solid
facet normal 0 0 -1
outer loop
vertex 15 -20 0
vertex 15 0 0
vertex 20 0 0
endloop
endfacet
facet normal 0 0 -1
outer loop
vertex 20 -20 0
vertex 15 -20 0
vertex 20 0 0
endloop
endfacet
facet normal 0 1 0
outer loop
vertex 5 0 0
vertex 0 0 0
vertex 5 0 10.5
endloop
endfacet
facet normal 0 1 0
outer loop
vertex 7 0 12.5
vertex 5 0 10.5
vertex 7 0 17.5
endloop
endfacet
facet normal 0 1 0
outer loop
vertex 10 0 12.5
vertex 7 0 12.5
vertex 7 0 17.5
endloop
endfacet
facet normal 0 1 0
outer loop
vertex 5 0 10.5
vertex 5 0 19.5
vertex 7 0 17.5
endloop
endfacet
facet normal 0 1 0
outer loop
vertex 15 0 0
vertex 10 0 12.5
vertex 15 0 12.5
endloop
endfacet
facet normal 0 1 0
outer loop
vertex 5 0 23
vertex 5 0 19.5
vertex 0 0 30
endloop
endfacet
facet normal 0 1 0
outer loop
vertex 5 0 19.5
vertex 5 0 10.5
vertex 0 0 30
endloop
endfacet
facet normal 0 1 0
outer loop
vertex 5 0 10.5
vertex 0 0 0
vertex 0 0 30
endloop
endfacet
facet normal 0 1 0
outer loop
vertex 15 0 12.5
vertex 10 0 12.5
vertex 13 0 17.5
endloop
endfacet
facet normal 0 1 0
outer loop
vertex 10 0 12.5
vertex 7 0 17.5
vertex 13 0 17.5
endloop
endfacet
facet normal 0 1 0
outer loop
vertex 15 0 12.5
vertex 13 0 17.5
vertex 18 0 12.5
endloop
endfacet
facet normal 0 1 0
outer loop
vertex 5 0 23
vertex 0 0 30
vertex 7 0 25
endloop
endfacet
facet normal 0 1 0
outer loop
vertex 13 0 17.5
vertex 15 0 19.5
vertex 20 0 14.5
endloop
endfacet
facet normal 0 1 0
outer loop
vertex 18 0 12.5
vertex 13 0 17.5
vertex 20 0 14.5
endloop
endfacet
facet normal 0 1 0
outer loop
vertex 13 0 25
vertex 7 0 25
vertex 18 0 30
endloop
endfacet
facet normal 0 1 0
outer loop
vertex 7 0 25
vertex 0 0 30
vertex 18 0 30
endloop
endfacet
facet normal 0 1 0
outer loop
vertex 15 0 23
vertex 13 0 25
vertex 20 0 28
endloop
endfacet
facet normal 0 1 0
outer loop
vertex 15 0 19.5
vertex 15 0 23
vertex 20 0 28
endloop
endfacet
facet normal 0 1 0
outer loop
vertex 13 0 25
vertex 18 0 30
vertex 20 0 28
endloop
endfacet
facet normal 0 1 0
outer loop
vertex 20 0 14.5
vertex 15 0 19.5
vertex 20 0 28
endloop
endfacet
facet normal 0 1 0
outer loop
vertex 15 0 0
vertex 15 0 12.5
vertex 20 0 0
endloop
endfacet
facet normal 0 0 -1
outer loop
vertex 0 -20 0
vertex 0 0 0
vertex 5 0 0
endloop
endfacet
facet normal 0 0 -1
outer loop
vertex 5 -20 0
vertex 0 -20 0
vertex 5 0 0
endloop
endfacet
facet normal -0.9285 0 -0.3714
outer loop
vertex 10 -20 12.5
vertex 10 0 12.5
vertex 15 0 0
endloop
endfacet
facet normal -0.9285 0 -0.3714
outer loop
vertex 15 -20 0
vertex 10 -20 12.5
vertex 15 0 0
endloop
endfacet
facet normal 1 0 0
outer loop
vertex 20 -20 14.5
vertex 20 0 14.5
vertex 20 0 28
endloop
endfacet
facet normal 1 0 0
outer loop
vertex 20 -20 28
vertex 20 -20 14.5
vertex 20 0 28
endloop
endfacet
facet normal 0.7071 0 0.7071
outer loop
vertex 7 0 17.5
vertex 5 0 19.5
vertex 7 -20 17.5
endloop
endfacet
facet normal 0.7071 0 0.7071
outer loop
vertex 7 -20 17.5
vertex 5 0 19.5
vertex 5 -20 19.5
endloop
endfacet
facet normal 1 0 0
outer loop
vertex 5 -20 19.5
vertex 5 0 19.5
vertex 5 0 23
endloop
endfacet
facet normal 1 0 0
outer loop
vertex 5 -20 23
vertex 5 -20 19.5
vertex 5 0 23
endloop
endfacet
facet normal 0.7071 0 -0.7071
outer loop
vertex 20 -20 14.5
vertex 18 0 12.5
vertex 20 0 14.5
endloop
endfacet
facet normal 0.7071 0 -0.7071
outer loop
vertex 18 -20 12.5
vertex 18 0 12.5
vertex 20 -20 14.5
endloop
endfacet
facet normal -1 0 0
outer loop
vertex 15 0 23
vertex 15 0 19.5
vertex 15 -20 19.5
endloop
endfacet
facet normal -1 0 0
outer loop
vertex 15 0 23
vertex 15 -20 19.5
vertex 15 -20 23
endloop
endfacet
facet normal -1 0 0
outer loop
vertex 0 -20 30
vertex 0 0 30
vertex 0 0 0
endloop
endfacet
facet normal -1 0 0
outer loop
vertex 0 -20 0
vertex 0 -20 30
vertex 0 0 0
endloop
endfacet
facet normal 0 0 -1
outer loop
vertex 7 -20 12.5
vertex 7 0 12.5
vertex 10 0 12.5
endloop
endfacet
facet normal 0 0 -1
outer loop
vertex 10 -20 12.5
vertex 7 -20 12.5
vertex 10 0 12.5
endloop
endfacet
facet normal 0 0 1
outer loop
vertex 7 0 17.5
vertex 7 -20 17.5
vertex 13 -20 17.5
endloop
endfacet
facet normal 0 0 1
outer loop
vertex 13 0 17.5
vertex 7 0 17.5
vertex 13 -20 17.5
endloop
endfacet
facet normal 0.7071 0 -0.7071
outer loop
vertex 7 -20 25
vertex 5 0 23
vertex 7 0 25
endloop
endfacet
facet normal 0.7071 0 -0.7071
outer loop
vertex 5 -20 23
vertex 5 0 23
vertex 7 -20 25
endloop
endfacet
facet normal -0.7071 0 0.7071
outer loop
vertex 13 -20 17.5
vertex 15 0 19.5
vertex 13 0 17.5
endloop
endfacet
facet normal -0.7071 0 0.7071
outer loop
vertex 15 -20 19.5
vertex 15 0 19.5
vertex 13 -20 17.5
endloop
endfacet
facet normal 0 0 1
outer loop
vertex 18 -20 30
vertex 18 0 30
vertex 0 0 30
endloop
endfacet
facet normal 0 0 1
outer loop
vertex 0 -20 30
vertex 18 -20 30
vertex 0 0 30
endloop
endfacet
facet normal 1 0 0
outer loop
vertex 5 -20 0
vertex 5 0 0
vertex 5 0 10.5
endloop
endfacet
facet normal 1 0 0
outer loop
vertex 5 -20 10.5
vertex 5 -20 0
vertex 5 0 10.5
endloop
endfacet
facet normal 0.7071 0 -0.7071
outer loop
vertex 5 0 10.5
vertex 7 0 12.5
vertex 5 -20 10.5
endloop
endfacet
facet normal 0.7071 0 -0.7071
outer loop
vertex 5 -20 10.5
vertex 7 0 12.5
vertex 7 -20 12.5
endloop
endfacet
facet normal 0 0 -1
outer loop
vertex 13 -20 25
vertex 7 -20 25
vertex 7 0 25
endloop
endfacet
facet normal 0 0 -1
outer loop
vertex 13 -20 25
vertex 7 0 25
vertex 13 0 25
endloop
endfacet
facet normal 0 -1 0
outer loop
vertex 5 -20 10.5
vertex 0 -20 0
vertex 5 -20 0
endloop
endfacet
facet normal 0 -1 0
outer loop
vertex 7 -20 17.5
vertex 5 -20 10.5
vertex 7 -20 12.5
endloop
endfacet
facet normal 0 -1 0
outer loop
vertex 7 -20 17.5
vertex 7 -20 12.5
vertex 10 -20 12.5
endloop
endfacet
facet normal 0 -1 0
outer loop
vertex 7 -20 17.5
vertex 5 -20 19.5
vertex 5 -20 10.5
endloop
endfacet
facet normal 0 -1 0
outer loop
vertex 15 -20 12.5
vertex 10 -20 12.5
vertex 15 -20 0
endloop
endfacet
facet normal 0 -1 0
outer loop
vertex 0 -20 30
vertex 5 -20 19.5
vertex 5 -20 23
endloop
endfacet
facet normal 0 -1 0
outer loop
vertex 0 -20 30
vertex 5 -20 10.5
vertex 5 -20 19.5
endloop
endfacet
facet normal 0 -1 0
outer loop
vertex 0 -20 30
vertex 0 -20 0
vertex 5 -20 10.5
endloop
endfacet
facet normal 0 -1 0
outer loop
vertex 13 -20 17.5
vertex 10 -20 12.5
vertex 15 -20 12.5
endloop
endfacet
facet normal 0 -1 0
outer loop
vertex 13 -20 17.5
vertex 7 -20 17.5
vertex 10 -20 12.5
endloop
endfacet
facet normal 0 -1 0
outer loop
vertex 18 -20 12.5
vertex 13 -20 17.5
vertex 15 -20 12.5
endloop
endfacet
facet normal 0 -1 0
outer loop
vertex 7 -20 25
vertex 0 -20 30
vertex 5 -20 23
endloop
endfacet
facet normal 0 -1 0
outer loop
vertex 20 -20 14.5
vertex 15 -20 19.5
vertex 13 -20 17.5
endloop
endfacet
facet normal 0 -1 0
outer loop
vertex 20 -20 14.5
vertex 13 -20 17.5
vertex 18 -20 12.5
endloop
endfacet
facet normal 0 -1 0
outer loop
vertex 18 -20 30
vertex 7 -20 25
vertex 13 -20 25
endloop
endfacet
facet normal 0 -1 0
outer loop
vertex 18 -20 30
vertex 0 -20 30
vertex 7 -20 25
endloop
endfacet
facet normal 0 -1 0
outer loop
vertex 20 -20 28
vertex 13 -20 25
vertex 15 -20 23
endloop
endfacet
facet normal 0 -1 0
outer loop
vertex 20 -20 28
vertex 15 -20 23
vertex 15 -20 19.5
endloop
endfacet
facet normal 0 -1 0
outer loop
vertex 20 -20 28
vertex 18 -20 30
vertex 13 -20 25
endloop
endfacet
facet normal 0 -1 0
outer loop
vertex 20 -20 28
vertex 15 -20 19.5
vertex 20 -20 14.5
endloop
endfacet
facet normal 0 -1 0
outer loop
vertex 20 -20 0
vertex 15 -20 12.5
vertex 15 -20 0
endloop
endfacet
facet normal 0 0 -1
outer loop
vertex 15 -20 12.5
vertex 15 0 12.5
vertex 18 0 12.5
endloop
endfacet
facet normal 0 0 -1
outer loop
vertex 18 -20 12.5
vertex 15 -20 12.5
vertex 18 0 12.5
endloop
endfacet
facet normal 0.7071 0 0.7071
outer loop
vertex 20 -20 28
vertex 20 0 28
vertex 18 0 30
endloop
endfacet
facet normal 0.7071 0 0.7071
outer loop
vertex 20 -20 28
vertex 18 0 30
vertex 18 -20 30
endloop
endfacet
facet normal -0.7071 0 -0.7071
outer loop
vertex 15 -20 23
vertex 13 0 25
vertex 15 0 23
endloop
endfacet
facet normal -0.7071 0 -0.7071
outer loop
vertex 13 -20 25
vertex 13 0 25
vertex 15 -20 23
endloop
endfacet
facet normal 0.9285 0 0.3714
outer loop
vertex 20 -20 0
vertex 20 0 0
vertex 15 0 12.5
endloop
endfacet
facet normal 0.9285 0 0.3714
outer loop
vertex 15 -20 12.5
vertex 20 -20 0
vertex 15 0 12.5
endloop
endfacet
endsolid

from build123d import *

# Parameters (mm, degrees)
F0_W     = 10
F0_H     = 7.5
F1_DEPTH = 20
F2_SIZE  = 2


with BuildPart() as f1:
    # F0 (on Front) → F1 (new body)
    with BuildSketch(Plane.XZ):
        Polygon((0, 30), (0, 0), (5, 0), (5, 12.5), (10, 12.5), (15, 0), (20, 0), (15, 12.5), (20, 12.5), (20, 30), align=None)
        with Locations((10, 21.25)):
            Rectangle(F0_W, F0_H, mode=Mode.SUBTRACT)
    extrude(amount=F1_DEPTH)

    # F2
    f2_edges = [f1.edges().sort_by_distance(p)[0] for p in [
        (20, -10, 30),
        (20, -10, 12.5),
        (5, -10, 17.5),
        (5, -10, 25),
        (5, -10, 12.5),
        (15, -10, 25),
        (15, -10, 17.5),
    ]]
    chamfer(f2_edges, length=F2_SIZE)


solid = f1.part
